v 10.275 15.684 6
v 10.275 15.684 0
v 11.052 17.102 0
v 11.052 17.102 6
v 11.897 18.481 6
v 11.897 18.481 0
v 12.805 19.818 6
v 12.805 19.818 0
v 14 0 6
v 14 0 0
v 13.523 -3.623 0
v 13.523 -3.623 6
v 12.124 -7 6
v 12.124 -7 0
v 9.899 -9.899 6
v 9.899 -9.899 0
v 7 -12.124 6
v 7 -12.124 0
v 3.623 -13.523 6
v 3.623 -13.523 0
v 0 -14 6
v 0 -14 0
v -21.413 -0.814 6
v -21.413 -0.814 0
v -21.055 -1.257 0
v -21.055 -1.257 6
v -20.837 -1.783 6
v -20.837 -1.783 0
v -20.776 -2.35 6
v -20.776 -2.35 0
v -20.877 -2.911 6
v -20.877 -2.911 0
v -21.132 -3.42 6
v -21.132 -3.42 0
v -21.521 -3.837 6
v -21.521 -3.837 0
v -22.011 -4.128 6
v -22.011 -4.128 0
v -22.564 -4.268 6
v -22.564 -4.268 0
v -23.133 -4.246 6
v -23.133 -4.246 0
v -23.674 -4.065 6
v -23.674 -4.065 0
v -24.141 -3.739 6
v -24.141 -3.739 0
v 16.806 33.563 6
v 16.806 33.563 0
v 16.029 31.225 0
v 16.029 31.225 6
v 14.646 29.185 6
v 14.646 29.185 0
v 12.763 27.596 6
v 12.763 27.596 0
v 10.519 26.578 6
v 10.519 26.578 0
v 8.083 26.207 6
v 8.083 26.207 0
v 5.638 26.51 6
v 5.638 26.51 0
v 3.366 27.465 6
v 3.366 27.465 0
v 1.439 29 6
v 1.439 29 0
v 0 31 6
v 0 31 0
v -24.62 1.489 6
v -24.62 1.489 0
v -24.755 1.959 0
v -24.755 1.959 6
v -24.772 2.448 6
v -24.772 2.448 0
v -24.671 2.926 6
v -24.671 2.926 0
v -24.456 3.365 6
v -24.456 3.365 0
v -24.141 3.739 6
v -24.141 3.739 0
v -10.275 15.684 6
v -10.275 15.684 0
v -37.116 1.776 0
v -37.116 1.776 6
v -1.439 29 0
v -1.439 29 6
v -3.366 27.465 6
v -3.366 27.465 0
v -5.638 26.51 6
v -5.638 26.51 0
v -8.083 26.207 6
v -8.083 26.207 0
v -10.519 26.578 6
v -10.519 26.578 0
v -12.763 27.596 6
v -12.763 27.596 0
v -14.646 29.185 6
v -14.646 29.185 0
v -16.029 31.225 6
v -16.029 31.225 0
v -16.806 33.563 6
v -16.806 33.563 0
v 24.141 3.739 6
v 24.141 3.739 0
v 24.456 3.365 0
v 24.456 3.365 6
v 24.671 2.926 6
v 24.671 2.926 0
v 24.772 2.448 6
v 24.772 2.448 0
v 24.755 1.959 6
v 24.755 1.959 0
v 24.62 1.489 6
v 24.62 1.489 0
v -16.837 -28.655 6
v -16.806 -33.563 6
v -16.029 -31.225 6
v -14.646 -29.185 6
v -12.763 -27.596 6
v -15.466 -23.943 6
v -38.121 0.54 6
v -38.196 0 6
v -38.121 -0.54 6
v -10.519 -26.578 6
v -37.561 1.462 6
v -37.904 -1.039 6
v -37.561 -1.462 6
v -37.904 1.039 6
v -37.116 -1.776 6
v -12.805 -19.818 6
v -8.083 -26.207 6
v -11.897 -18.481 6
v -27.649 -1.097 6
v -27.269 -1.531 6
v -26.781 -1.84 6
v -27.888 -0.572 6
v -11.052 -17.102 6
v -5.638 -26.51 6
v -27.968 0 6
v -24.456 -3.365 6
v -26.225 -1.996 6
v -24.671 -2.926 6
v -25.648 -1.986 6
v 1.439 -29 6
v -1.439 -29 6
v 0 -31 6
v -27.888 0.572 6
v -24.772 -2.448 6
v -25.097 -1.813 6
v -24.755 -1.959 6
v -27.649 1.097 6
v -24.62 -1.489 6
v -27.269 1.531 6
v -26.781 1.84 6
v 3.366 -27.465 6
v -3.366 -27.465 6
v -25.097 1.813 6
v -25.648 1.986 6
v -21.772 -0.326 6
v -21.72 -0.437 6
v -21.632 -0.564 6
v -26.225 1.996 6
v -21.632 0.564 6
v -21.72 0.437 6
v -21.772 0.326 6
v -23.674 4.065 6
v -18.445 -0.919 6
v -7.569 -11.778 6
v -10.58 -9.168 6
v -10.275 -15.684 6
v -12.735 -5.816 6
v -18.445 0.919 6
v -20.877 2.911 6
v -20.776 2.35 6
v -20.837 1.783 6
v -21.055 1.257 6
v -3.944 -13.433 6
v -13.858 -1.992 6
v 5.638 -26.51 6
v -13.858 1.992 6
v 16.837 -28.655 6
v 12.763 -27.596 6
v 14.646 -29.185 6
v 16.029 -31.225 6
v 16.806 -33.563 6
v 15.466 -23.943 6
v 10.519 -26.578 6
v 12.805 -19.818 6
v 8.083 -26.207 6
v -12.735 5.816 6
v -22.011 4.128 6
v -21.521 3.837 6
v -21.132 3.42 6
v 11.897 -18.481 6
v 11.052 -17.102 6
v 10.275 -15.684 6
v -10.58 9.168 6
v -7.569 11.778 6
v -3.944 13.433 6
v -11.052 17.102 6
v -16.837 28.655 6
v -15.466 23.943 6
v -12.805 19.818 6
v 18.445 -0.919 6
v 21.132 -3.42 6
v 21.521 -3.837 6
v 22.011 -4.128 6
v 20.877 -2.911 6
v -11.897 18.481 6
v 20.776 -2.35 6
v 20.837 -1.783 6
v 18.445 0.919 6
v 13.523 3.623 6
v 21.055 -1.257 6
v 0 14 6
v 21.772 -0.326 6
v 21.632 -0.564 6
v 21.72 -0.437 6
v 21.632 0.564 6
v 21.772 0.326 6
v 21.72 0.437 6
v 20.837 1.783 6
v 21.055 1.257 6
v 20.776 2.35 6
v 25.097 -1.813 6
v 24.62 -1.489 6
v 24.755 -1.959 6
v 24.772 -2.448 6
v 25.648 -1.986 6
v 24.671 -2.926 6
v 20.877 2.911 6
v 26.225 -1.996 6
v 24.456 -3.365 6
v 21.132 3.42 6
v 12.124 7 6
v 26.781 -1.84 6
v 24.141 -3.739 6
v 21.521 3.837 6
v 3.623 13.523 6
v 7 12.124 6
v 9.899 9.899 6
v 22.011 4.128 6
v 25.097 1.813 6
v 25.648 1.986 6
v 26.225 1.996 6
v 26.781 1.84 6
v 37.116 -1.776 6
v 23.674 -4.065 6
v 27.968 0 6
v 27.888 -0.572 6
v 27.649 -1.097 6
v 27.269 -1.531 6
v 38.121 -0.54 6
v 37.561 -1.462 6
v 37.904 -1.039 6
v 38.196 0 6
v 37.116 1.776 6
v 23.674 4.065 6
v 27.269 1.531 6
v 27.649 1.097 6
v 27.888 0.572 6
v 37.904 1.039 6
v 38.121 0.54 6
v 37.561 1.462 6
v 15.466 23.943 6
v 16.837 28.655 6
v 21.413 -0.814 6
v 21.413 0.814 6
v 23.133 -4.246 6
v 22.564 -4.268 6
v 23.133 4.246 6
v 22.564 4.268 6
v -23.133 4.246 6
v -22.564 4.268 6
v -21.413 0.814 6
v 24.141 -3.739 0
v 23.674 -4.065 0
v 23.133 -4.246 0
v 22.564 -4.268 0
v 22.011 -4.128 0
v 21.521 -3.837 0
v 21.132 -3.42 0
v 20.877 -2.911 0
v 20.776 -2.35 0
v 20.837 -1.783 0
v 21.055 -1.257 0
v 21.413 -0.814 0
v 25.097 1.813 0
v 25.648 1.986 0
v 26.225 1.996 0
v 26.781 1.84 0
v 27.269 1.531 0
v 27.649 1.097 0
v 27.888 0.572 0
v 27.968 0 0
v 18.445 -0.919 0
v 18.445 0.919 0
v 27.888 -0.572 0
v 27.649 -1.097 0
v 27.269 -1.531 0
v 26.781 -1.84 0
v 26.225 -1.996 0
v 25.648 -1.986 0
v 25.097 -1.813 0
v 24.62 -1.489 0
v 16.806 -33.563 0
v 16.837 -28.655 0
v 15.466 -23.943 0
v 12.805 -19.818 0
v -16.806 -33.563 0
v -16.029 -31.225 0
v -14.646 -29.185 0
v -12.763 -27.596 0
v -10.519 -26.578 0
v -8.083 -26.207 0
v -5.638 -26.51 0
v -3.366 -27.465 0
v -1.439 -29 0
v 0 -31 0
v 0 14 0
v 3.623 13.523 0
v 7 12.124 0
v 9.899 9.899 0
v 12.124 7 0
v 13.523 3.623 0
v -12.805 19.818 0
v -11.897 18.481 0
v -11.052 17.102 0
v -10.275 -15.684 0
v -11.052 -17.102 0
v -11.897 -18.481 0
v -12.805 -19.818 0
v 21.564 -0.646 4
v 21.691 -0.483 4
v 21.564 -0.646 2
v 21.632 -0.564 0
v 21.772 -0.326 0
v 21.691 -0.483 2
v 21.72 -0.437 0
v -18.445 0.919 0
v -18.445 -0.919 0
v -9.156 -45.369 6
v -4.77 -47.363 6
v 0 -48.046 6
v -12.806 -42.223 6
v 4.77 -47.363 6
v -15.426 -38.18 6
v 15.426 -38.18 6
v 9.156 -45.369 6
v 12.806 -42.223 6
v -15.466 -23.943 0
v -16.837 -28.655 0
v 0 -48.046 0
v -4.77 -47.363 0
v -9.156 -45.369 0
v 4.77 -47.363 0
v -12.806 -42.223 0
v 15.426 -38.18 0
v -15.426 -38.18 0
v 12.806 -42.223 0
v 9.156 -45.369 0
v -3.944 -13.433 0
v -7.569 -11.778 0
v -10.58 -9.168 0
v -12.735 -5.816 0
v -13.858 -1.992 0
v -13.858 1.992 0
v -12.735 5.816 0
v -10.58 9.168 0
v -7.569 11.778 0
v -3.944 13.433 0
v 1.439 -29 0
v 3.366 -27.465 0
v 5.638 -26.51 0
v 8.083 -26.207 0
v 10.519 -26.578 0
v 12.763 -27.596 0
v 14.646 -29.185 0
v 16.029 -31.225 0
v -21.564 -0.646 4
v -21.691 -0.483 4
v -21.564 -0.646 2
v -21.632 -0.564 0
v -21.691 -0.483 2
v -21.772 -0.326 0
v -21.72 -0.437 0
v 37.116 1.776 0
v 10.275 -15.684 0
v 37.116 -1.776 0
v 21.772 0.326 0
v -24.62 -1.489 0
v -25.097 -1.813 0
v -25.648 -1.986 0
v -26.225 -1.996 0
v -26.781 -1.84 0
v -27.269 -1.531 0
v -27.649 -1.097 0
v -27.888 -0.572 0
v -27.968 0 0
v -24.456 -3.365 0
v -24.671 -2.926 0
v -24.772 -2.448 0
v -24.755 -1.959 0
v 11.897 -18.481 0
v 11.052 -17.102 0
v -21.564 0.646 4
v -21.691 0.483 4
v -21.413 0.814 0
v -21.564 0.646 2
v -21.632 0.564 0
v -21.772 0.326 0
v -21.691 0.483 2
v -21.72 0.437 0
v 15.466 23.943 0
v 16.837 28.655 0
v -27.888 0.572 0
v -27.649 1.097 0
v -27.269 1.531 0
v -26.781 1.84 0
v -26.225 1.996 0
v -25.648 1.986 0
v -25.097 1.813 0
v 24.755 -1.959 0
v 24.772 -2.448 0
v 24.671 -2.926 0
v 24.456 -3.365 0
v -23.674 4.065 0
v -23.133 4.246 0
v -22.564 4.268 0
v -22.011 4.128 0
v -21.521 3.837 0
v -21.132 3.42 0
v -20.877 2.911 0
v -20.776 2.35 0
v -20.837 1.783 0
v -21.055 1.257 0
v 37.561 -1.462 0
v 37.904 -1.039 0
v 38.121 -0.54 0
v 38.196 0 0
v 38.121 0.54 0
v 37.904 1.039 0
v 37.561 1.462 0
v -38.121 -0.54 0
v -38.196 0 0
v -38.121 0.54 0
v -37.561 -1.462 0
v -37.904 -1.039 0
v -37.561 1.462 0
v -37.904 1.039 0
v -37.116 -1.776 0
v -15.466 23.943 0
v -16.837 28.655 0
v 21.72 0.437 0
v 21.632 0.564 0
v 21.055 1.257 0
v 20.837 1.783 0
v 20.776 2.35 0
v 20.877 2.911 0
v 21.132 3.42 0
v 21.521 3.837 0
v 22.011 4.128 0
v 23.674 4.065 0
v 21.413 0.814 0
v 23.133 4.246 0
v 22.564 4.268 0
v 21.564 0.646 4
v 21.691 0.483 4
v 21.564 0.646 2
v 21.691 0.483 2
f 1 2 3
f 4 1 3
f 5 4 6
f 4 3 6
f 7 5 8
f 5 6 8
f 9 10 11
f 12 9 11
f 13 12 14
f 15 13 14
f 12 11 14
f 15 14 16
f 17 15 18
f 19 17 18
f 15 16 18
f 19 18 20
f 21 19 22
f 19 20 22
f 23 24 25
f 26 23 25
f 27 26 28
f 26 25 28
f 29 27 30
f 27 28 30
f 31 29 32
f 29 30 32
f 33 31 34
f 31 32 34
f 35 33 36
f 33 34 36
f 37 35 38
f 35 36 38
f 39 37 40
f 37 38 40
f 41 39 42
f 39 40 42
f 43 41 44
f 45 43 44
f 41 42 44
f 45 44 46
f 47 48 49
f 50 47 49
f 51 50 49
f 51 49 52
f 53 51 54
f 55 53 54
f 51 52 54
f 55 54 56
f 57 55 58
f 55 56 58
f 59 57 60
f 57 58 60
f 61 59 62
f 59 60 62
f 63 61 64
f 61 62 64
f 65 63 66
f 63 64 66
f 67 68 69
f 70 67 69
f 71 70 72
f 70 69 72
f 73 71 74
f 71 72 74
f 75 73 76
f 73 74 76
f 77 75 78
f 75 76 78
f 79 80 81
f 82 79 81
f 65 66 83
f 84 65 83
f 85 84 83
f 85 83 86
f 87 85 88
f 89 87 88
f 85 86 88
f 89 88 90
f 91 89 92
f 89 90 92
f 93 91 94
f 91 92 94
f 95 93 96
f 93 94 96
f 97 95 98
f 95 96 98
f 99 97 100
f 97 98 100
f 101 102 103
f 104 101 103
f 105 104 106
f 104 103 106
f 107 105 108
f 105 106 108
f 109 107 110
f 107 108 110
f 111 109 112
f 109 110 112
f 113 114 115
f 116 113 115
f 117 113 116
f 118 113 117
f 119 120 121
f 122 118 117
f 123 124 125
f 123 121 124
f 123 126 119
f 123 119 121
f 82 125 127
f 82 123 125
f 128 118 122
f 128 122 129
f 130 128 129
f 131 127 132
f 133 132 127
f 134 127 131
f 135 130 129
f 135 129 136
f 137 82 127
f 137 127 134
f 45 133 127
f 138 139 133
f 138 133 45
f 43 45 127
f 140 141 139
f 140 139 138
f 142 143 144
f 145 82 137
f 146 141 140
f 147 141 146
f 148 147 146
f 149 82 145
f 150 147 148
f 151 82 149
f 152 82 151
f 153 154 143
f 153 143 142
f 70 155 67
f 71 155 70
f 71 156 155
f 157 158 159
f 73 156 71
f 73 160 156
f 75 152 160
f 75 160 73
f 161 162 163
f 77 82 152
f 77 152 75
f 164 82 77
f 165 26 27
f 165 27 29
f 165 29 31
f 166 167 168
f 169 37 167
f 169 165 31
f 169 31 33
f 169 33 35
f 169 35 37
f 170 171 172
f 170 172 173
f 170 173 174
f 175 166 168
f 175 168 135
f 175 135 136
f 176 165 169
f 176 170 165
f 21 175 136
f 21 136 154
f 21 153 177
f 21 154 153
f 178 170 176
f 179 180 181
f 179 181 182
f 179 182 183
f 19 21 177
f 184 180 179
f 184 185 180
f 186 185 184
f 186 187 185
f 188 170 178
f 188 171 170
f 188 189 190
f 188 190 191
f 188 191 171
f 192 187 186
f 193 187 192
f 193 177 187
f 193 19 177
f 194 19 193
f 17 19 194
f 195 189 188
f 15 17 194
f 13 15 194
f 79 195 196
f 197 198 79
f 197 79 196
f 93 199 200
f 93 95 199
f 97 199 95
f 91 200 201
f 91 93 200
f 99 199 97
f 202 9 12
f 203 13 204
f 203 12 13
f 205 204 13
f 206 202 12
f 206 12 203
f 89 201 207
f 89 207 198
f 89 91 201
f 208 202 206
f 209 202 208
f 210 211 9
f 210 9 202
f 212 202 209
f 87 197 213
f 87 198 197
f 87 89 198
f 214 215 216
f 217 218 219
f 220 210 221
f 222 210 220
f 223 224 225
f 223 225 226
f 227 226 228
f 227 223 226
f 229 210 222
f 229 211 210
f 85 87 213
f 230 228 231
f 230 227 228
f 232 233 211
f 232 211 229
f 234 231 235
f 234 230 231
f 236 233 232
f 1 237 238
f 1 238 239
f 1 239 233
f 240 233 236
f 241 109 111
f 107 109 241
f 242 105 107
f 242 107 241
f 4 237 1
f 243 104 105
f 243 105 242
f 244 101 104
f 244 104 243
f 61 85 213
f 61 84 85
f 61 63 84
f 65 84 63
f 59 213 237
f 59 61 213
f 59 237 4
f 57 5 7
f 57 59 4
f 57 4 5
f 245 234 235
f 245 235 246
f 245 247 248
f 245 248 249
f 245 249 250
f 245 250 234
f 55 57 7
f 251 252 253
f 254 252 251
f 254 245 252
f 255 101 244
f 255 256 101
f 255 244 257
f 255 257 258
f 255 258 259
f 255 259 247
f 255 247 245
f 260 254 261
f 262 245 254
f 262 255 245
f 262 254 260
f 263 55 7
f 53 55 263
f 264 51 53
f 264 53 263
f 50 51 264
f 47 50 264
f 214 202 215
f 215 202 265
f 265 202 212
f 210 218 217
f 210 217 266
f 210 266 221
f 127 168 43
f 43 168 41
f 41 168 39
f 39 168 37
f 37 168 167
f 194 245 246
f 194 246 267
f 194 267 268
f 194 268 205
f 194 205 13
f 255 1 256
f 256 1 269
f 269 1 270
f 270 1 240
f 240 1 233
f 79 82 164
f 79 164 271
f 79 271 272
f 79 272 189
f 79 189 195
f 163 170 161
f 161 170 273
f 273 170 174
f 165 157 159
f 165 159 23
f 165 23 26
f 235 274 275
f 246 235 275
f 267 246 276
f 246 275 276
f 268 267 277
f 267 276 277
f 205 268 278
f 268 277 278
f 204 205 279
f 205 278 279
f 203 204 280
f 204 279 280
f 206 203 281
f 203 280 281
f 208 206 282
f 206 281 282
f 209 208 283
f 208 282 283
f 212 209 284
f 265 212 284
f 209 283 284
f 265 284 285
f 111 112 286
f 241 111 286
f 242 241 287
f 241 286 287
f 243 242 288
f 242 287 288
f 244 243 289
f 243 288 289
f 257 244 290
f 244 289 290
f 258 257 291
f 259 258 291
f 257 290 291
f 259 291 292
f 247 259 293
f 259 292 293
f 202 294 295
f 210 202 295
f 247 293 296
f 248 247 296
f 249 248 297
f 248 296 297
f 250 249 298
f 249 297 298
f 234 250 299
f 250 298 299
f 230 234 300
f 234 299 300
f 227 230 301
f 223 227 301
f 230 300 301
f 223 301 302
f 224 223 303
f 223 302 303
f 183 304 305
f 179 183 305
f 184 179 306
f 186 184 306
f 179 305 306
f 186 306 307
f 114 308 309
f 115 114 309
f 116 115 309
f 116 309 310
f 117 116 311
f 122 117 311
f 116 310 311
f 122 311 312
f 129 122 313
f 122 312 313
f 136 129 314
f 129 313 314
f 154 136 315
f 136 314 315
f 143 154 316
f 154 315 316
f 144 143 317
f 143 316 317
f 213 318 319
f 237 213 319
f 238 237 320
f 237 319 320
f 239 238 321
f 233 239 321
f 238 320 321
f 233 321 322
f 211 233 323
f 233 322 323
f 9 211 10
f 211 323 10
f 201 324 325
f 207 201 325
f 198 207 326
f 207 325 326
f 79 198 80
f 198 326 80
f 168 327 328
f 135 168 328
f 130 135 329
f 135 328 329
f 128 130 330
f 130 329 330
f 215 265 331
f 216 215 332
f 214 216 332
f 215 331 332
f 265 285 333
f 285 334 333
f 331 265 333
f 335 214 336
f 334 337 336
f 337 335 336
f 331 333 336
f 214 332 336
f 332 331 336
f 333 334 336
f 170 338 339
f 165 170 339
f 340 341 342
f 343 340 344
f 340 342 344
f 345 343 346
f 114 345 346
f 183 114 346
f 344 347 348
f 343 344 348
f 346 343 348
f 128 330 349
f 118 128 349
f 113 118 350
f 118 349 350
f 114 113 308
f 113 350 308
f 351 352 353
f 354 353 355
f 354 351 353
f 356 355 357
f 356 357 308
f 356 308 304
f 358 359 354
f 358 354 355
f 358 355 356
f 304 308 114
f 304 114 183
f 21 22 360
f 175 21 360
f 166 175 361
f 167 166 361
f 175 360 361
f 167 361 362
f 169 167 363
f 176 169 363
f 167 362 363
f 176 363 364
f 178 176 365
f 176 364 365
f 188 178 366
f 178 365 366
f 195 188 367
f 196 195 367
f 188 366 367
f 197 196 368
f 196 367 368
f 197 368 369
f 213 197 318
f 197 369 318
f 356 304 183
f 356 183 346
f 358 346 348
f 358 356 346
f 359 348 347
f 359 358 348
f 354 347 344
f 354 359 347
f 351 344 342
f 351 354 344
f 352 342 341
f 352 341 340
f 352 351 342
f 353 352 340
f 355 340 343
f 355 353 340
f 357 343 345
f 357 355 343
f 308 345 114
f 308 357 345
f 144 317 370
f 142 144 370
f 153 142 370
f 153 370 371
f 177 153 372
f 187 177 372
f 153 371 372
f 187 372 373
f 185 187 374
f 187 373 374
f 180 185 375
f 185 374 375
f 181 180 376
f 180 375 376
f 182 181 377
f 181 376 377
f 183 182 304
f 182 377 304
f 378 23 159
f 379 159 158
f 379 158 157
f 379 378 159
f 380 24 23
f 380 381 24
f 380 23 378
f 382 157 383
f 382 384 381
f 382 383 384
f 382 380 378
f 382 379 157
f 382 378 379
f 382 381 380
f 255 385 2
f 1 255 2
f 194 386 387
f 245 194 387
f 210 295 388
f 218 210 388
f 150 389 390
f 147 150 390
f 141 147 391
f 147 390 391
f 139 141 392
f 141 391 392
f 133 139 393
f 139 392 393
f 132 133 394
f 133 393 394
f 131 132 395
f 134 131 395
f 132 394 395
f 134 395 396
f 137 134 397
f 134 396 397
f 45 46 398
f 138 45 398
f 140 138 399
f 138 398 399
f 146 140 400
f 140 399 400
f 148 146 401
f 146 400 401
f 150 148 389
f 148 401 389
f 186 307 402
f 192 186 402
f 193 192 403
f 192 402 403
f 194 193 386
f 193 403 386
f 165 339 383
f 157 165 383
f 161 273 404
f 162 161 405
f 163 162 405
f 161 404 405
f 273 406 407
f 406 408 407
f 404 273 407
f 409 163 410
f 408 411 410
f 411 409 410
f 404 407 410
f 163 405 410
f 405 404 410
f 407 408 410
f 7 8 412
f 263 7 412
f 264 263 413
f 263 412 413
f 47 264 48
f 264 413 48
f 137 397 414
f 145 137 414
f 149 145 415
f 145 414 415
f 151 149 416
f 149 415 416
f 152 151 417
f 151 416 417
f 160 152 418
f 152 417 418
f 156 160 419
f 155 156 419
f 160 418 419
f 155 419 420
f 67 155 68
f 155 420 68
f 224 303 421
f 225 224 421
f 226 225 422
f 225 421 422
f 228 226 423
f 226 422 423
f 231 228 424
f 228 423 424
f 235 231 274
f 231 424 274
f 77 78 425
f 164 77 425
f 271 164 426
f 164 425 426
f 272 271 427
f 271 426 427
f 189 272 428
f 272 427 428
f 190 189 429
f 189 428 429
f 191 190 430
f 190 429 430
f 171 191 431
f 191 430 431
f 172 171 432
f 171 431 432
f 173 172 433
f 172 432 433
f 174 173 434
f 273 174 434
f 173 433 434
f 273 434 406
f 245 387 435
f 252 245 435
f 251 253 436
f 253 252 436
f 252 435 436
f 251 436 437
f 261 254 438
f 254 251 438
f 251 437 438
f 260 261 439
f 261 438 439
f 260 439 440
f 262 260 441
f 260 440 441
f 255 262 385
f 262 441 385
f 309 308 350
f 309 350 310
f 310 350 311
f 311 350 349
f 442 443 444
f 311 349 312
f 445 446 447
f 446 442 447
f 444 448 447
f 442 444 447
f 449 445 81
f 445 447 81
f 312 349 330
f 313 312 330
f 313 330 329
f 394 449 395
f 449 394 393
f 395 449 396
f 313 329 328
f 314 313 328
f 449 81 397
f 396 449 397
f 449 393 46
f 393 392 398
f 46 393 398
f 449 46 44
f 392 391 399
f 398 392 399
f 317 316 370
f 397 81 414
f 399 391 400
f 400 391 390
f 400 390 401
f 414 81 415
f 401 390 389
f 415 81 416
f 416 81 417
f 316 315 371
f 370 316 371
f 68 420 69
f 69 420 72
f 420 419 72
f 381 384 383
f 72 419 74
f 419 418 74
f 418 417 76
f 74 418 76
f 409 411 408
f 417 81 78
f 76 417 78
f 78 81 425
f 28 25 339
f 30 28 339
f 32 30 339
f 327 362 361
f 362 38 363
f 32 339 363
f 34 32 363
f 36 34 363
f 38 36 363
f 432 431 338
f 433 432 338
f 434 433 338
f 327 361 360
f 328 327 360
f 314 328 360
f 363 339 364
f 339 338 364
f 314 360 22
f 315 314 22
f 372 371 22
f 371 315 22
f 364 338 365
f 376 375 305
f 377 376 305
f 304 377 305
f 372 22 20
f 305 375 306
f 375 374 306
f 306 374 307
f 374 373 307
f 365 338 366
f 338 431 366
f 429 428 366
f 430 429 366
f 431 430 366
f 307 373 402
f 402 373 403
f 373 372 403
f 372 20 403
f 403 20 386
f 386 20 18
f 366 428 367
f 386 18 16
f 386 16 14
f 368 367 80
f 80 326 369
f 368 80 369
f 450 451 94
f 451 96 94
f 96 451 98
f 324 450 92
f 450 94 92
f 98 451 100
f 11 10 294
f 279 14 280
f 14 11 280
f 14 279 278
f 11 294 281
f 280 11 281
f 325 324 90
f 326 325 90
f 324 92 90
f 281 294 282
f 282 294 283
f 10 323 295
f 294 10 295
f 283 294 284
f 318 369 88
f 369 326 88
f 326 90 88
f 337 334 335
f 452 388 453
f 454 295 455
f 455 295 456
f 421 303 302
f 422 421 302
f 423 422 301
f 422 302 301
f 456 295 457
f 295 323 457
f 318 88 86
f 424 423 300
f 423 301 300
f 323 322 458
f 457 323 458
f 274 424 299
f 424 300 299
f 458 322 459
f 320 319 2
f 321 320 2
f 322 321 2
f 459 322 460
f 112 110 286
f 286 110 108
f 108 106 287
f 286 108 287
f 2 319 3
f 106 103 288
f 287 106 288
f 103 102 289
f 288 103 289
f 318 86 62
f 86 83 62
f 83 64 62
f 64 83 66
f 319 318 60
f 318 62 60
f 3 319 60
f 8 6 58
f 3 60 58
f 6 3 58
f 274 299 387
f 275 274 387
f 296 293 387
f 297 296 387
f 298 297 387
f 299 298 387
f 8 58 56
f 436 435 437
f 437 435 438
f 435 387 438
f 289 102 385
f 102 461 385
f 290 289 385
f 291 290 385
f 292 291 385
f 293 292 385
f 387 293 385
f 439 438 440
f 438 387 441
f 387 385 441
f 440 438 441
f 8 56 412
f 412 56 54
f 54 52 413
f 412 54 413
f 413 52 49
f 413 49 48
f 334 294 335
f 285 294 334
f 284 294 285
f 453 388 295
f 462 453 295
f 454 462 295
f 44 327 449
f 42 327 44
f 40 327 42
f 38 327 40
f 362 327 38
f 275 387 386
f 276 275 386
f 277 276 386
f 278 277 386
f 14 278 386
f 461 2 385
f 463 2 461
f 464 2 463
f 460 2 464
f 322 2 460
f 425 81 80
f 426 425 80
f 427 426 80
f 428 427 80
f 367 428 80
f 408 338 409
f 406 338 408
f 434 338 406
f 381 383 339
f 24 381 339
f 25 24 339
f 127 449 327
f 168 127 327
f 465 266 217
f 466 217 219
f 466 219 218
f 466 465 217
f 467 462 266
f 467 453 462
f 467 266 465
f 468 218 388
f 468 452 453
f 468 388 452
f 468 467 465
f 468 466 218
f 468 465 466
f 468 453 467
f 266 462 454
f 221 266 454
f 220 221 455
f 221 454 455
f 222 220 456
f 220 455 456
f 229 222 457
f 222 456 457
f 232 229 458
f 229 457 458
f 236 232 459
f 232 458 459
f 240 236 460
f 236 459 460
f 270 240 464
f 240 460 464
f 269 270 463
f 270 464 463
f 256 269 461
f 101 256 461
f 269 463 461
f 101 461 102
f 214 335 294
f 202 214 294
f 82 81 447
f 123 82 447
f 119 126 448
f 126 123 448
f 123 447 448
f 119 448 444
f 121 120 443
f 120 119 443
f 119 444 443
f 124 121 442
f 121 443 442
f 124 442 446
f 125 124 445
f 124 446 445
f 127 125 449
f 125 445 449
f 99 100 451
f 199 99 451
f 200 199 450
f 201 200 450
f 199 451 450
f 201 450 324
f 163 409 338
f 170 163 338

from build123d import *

# Parameters (mm, degrees)
F1_DEPTH    = 6
F2_T1_DEPTH = 25.2986514743
F4_DEPTH    = 6


# Not quite as in the source:
# - a fillet or chamfer that OpenCascade refuses, or shapes differently, is made with other operations: its cross-section is extruded or revolved along the edge and cut away or added


with BuildPart() as f1:
    # F0 (on Top) → F1 (new body)
    with BuildSketch(Plane.XY):
        with BuildLine():
            ThreePointArc((-5.8e-09, 14), (9.8994949346, 9.8994949386), (14, 0))
            ThreePointArc((14, 0), (9.8994949148, -9.8994949584), (-6.17e-08, -14))
            ThreePointArc((-6.17e-08, -14), (7.0324678211, -15.5227781451), (12.8050664705, -19.8183063588))
            ThreePointArc((12.8050664705, -19.8183063588), (11.4663069969, -17.796201056), (10.2746927153, -15.6840357719))
            Line((10.2746927153, -15.6840357719), (37.1157870048, -1.775761235))
            ThreePointArc((37.1157870048, -1.775761235), (38.195639171, 0), (37.1157870048, 1.775761235))
            Line((37.1157870048, 1.775761235), (10.2746927153, 15.6840357719))
            ThreePointArc((10.2746927153, 15.6840357719), (11.4663069969, 17.796201056), (12.8050664705, 19.8183063588))
            ThreePointArc((12.8050664705, 19.8183063588), (7.0324678466, 15.5227781567), (-5.8e-09, 14))
        make_face()
        with BuildLine():
            ThreePointArc((24.141058394, -3.738981755), (21.3116357879, -3.6427693993), (21.4131139219, -0.813530758))
            add(Edge.make_bspline(
                [(21.4131139219, -0.813530758), (21.5685270189, -0.6433130102), (21.7212531535, -0.4797257131), (21.771568805, -0.3264895931)],
                knots=[0, 0, 0, 0, 0.5764439926, 0.5764439926, 0.5764439926, 0.5764439926], degree=3))
            Line((21.771568805, -0.3264895931), (18.4447020292, -0.9186793468))
            Line((18.4447020292, -0.9186793468), (18.4447020292, 0.9186793468))
            Line((18.4447020292, 0.9186793468), (21.771568805, 0.3264895931))
            add(Edge.make_bspline(
                [(21.4131139219, 0.813530758), (21.5685270189, 0.6433130102), (21.7212531535, 0.4797257131), (21.771568805, 0.3264895931)],
                knots=[0, 0, 0, 0, 0.5764439926, 0.5764439926, 0.5764439926, 0.5764439926], degree=3))
            ThreePointArc((21.4131139219, 0.813530758), (21.3116357879, 3.6427693993), (24.141058394, 3.738981755))
            ThreePointArc((24.141058394, 3.738981755), (24.736062035, 2.6897370524), (24.6195059471, 1.4891711621))
            ThreePointArc((24.6195059471, 1.4891711621), (26.7807777011, 1.8396612496), (27.9680373117, 0))
            ThreePointArc((27.9680373117, 0), (26.7807777011, -1.8396612496), (24.6195059471, -1.4891711621))
            ThreePointArc((24.6195059471, -1.4891711621), (24.736062035, -2.6897370524), (24.141058394, -3.738981755))
        make_face(mode=Mode.SUBTRACT)
        with BuildLine():
            ThreePointArc((-6.17e-08, -14), (-14, 2.8e-08), (-5.8e-09, 14))
            ThreePointArc((-5.8e-09, 14), (-7.0324678518, 15.5227781591), (-12.8050664705, 19.8183063588))
            ThreePointArc((-12.8050664705, 19.8183063588), (-11.4663069969, 17.796201056), (-10.2746927153, 15.6840357719))
            Line((-10.2746927153, 15.6840357719), (-37.1157870048, 1.775761235))
            ThreePointArc((-37.1157870048, 1.775761235), (-38.195639171, 0), (-37.1157870048, -1.775761235))
            Line((-37.1157870048, -1.775761235), (-10.2746927153, -15.6840357719))
            ThreePointArc((-10.2746927153, -15.6840357719), (-11.4663069969, -17.796201056), (-12.8050664705, -19.8183063588))
            ThreePointArc((-12.8050664705, -19.8183063588), (-7.0324678773, -15.5227781707), (-6.17e-08, -14))
        make_face()
        with BuildLine():
            ThreePointArc((-24.6195059471, -1.4891711621), (-26.7807777011, -1.8396612496), (-27.9680373117, 0))
            ThreePointArc((-27.9680373117, 0), (-26.7807777011, 1.8396612496), (-24.6195059471, 1.4891711621))
            ThreePointArc((-24.6195059471, 1.4891711621), (-24.736062035, 2.6897370524), (-24.141058394, 3.738981755))
            ThreePointArc((-24.141058394, 3.738981755), (-21.3116357879, 3.6427693993), (-21.4131139219, 0.813530758))
            add(Edge.make_bspline(
                [(-21.4131139219, 0.813530758), (-21.5685270189, 0.6433130102), (-21.7212531535, 0.4797257131), (-21.771568805, 0.3264895931)],
                knots=[0, 0, 0, 0, 0.5764439926, 0.5764439926, 0.5764439926, 0.5764439926], degree=3))
            Line((-21.771568805, 0.3264895931), (-18.4447020292, 0.9186793468))
            Line((-18.4447020292, 0.9186793468), (-18.4447020292, -0.9186793468))
            Line((-18.4447020292, -0.9186793468), (-21.771568805, -0.3264895931))
            add(Edge.make_bspline(
                [(-21.4131139219, -0.813530758), (-21.5685270189, -0.6433130102), (-21.7212531535, -0.4797257131), (-21.771568805, -0.3264895931)],
                knots=[0, 0, 0, 0, 0.5764439926, 0.5764439926, 0.5764439926, 0.5764439926], degree=3))
            ThreePointArc((-21.4131139219, -0.813530758), (-21.3116357879, -3.6427693993), (-24.141058394, -3.738981755))
            ThreePointArc((-24.141058394, -3.738981755), (-24.736062035, -2.6897370524), (-24.6195059471, -1.4891711621))
        make_face(mode=Mode.SUBTRACT)
        with BuildLine():
            ThreePointArc((-12.8050664705, 19.8183063588), (-7.0324678518, 15.5227781591), (-5.8e-09, 14))
            ThreePointArc((-5.8e-09, 14), (7.0324678466, 15.5227781567), (12.8050664705, 19.8183063588))
            ThreePointArc((12.8050664705, 19.8183063588), (16.3226196216, 26.2489907715), (16.8056971277, 33.5629170979))
            ThreePointArc((16.8056971277, 33.5629170979), (9.3137334384, 26.3085555113), (0, 31))
            ThreePointArc((0, 31), (-9.3137334384, 26.3085555113), (-16.8056971277, 33.5629170979))
            ThreePointArc((-16.8056971277, 33.5629170979), (-16.3226196216, 26.2489907715), (-12.8050664705, 19.8183063588))
        make_face()
        with BuildLine():
            ThreePointArc((12.8050664705, -19.8183063588), (7.0324678211, -15.5227781451), (-6.17e-08, -14))
            ThreePointArc((-6.17e-08, -14), (-7.0324678773, -15.5227781707), (-12.8050664705, -19.8183063588))
            ThreePointArc((-12.8050664705, -19.8183063588), (-16.3226196216, -26.2489907715), (-16.8056971277, -33.5629170979))
            ThreePointArc((-16.8056971277, -33.5629170979), (-9.3137334384, -26.3085555113), (0, -31))
            ThreePointArc((0, -31), (9.3137334384, -26.3085555113), (16.8056971277, -33.5629170979))
            ThreePointArc((16.8056971277, -33.5629170979), (16.3226196216, -26.2489907715), (12.8050664705, -19.8183063588))
        make_face()
        with BuildLine():
            ThreePointArc((-37.1157870048, -1.775761235), (-38.195639171, 0), (-37.1157870048, 1.775761235))
            Line((-37.1157870048, 1.775761235), (-40.5427667225, 0))
            Line((-40.5427667225, 0), (-37.1157870048, -1.775761235))
        make_face()
        with BuildLine():
            Line((40.5427667225, 0), (37.1157870048, 1.775761235))
            ThreePointArc((37.1157870048, 1.775761235), (38.195639171, 0), (37.1157870048, -1.775761235))
            Line((37.1157870048, -1.775761235), (40.5427667225, 0))
        make_face()
    extrude(amount=F1_DEPTH)

    # F2: fillet of radius 2 on 2 edges, made by hand

    # F2_s2 → F2_t1 (cut)
    with BuildSketch(Plane.XY.offset(-9.6493257372)):
        with BuildLine():
            ThreePointArc((-37.1157870048, 1.775761235), (-38.195639171, 0), (-37.1157870048, -1.775761235))
            Line((-37.1157870048, -1.775761235), (-40.5427667225, 0))
            Line((-40.5427667225, 0), (-37.1157870048, 1.775761235))
        make_face()
        with BuildLine():
            ThreePointArc((37.1157870048, -1.775761235), (38.195639171, 0), (37.1157870048, 1.775761235))
            Line((37.1157870048, 1.775761235), (40.5427667225, 0))
            Line((40.5427667225, 0), (37.1157870048, -1.775761235))
        make_face()
    extrude(amount=F2_T1_DEPTH, mode=Mode.SUBTRACT)


with BuildPart() as f4:
    # F3 (on face) → F4 (new body)
    with BuildSketch(Plane(origin=(0, 0, 0), x_dir=(1, 0, 0), z_dir=(0, 0, -1))):
        with BuildLine():
            ThreePointArc((16.8056971277, 33.5629170979), (0, 48.046493252), (-16.8056971277, 33.5629170979))
            Line((-16.8056971277, 33.5629170979), (16.8056971277, 33.5629170979))
        make_face()
    extrude(amount=-F4_DEPTH)


solid = Compound([f1.part, f4.part])
